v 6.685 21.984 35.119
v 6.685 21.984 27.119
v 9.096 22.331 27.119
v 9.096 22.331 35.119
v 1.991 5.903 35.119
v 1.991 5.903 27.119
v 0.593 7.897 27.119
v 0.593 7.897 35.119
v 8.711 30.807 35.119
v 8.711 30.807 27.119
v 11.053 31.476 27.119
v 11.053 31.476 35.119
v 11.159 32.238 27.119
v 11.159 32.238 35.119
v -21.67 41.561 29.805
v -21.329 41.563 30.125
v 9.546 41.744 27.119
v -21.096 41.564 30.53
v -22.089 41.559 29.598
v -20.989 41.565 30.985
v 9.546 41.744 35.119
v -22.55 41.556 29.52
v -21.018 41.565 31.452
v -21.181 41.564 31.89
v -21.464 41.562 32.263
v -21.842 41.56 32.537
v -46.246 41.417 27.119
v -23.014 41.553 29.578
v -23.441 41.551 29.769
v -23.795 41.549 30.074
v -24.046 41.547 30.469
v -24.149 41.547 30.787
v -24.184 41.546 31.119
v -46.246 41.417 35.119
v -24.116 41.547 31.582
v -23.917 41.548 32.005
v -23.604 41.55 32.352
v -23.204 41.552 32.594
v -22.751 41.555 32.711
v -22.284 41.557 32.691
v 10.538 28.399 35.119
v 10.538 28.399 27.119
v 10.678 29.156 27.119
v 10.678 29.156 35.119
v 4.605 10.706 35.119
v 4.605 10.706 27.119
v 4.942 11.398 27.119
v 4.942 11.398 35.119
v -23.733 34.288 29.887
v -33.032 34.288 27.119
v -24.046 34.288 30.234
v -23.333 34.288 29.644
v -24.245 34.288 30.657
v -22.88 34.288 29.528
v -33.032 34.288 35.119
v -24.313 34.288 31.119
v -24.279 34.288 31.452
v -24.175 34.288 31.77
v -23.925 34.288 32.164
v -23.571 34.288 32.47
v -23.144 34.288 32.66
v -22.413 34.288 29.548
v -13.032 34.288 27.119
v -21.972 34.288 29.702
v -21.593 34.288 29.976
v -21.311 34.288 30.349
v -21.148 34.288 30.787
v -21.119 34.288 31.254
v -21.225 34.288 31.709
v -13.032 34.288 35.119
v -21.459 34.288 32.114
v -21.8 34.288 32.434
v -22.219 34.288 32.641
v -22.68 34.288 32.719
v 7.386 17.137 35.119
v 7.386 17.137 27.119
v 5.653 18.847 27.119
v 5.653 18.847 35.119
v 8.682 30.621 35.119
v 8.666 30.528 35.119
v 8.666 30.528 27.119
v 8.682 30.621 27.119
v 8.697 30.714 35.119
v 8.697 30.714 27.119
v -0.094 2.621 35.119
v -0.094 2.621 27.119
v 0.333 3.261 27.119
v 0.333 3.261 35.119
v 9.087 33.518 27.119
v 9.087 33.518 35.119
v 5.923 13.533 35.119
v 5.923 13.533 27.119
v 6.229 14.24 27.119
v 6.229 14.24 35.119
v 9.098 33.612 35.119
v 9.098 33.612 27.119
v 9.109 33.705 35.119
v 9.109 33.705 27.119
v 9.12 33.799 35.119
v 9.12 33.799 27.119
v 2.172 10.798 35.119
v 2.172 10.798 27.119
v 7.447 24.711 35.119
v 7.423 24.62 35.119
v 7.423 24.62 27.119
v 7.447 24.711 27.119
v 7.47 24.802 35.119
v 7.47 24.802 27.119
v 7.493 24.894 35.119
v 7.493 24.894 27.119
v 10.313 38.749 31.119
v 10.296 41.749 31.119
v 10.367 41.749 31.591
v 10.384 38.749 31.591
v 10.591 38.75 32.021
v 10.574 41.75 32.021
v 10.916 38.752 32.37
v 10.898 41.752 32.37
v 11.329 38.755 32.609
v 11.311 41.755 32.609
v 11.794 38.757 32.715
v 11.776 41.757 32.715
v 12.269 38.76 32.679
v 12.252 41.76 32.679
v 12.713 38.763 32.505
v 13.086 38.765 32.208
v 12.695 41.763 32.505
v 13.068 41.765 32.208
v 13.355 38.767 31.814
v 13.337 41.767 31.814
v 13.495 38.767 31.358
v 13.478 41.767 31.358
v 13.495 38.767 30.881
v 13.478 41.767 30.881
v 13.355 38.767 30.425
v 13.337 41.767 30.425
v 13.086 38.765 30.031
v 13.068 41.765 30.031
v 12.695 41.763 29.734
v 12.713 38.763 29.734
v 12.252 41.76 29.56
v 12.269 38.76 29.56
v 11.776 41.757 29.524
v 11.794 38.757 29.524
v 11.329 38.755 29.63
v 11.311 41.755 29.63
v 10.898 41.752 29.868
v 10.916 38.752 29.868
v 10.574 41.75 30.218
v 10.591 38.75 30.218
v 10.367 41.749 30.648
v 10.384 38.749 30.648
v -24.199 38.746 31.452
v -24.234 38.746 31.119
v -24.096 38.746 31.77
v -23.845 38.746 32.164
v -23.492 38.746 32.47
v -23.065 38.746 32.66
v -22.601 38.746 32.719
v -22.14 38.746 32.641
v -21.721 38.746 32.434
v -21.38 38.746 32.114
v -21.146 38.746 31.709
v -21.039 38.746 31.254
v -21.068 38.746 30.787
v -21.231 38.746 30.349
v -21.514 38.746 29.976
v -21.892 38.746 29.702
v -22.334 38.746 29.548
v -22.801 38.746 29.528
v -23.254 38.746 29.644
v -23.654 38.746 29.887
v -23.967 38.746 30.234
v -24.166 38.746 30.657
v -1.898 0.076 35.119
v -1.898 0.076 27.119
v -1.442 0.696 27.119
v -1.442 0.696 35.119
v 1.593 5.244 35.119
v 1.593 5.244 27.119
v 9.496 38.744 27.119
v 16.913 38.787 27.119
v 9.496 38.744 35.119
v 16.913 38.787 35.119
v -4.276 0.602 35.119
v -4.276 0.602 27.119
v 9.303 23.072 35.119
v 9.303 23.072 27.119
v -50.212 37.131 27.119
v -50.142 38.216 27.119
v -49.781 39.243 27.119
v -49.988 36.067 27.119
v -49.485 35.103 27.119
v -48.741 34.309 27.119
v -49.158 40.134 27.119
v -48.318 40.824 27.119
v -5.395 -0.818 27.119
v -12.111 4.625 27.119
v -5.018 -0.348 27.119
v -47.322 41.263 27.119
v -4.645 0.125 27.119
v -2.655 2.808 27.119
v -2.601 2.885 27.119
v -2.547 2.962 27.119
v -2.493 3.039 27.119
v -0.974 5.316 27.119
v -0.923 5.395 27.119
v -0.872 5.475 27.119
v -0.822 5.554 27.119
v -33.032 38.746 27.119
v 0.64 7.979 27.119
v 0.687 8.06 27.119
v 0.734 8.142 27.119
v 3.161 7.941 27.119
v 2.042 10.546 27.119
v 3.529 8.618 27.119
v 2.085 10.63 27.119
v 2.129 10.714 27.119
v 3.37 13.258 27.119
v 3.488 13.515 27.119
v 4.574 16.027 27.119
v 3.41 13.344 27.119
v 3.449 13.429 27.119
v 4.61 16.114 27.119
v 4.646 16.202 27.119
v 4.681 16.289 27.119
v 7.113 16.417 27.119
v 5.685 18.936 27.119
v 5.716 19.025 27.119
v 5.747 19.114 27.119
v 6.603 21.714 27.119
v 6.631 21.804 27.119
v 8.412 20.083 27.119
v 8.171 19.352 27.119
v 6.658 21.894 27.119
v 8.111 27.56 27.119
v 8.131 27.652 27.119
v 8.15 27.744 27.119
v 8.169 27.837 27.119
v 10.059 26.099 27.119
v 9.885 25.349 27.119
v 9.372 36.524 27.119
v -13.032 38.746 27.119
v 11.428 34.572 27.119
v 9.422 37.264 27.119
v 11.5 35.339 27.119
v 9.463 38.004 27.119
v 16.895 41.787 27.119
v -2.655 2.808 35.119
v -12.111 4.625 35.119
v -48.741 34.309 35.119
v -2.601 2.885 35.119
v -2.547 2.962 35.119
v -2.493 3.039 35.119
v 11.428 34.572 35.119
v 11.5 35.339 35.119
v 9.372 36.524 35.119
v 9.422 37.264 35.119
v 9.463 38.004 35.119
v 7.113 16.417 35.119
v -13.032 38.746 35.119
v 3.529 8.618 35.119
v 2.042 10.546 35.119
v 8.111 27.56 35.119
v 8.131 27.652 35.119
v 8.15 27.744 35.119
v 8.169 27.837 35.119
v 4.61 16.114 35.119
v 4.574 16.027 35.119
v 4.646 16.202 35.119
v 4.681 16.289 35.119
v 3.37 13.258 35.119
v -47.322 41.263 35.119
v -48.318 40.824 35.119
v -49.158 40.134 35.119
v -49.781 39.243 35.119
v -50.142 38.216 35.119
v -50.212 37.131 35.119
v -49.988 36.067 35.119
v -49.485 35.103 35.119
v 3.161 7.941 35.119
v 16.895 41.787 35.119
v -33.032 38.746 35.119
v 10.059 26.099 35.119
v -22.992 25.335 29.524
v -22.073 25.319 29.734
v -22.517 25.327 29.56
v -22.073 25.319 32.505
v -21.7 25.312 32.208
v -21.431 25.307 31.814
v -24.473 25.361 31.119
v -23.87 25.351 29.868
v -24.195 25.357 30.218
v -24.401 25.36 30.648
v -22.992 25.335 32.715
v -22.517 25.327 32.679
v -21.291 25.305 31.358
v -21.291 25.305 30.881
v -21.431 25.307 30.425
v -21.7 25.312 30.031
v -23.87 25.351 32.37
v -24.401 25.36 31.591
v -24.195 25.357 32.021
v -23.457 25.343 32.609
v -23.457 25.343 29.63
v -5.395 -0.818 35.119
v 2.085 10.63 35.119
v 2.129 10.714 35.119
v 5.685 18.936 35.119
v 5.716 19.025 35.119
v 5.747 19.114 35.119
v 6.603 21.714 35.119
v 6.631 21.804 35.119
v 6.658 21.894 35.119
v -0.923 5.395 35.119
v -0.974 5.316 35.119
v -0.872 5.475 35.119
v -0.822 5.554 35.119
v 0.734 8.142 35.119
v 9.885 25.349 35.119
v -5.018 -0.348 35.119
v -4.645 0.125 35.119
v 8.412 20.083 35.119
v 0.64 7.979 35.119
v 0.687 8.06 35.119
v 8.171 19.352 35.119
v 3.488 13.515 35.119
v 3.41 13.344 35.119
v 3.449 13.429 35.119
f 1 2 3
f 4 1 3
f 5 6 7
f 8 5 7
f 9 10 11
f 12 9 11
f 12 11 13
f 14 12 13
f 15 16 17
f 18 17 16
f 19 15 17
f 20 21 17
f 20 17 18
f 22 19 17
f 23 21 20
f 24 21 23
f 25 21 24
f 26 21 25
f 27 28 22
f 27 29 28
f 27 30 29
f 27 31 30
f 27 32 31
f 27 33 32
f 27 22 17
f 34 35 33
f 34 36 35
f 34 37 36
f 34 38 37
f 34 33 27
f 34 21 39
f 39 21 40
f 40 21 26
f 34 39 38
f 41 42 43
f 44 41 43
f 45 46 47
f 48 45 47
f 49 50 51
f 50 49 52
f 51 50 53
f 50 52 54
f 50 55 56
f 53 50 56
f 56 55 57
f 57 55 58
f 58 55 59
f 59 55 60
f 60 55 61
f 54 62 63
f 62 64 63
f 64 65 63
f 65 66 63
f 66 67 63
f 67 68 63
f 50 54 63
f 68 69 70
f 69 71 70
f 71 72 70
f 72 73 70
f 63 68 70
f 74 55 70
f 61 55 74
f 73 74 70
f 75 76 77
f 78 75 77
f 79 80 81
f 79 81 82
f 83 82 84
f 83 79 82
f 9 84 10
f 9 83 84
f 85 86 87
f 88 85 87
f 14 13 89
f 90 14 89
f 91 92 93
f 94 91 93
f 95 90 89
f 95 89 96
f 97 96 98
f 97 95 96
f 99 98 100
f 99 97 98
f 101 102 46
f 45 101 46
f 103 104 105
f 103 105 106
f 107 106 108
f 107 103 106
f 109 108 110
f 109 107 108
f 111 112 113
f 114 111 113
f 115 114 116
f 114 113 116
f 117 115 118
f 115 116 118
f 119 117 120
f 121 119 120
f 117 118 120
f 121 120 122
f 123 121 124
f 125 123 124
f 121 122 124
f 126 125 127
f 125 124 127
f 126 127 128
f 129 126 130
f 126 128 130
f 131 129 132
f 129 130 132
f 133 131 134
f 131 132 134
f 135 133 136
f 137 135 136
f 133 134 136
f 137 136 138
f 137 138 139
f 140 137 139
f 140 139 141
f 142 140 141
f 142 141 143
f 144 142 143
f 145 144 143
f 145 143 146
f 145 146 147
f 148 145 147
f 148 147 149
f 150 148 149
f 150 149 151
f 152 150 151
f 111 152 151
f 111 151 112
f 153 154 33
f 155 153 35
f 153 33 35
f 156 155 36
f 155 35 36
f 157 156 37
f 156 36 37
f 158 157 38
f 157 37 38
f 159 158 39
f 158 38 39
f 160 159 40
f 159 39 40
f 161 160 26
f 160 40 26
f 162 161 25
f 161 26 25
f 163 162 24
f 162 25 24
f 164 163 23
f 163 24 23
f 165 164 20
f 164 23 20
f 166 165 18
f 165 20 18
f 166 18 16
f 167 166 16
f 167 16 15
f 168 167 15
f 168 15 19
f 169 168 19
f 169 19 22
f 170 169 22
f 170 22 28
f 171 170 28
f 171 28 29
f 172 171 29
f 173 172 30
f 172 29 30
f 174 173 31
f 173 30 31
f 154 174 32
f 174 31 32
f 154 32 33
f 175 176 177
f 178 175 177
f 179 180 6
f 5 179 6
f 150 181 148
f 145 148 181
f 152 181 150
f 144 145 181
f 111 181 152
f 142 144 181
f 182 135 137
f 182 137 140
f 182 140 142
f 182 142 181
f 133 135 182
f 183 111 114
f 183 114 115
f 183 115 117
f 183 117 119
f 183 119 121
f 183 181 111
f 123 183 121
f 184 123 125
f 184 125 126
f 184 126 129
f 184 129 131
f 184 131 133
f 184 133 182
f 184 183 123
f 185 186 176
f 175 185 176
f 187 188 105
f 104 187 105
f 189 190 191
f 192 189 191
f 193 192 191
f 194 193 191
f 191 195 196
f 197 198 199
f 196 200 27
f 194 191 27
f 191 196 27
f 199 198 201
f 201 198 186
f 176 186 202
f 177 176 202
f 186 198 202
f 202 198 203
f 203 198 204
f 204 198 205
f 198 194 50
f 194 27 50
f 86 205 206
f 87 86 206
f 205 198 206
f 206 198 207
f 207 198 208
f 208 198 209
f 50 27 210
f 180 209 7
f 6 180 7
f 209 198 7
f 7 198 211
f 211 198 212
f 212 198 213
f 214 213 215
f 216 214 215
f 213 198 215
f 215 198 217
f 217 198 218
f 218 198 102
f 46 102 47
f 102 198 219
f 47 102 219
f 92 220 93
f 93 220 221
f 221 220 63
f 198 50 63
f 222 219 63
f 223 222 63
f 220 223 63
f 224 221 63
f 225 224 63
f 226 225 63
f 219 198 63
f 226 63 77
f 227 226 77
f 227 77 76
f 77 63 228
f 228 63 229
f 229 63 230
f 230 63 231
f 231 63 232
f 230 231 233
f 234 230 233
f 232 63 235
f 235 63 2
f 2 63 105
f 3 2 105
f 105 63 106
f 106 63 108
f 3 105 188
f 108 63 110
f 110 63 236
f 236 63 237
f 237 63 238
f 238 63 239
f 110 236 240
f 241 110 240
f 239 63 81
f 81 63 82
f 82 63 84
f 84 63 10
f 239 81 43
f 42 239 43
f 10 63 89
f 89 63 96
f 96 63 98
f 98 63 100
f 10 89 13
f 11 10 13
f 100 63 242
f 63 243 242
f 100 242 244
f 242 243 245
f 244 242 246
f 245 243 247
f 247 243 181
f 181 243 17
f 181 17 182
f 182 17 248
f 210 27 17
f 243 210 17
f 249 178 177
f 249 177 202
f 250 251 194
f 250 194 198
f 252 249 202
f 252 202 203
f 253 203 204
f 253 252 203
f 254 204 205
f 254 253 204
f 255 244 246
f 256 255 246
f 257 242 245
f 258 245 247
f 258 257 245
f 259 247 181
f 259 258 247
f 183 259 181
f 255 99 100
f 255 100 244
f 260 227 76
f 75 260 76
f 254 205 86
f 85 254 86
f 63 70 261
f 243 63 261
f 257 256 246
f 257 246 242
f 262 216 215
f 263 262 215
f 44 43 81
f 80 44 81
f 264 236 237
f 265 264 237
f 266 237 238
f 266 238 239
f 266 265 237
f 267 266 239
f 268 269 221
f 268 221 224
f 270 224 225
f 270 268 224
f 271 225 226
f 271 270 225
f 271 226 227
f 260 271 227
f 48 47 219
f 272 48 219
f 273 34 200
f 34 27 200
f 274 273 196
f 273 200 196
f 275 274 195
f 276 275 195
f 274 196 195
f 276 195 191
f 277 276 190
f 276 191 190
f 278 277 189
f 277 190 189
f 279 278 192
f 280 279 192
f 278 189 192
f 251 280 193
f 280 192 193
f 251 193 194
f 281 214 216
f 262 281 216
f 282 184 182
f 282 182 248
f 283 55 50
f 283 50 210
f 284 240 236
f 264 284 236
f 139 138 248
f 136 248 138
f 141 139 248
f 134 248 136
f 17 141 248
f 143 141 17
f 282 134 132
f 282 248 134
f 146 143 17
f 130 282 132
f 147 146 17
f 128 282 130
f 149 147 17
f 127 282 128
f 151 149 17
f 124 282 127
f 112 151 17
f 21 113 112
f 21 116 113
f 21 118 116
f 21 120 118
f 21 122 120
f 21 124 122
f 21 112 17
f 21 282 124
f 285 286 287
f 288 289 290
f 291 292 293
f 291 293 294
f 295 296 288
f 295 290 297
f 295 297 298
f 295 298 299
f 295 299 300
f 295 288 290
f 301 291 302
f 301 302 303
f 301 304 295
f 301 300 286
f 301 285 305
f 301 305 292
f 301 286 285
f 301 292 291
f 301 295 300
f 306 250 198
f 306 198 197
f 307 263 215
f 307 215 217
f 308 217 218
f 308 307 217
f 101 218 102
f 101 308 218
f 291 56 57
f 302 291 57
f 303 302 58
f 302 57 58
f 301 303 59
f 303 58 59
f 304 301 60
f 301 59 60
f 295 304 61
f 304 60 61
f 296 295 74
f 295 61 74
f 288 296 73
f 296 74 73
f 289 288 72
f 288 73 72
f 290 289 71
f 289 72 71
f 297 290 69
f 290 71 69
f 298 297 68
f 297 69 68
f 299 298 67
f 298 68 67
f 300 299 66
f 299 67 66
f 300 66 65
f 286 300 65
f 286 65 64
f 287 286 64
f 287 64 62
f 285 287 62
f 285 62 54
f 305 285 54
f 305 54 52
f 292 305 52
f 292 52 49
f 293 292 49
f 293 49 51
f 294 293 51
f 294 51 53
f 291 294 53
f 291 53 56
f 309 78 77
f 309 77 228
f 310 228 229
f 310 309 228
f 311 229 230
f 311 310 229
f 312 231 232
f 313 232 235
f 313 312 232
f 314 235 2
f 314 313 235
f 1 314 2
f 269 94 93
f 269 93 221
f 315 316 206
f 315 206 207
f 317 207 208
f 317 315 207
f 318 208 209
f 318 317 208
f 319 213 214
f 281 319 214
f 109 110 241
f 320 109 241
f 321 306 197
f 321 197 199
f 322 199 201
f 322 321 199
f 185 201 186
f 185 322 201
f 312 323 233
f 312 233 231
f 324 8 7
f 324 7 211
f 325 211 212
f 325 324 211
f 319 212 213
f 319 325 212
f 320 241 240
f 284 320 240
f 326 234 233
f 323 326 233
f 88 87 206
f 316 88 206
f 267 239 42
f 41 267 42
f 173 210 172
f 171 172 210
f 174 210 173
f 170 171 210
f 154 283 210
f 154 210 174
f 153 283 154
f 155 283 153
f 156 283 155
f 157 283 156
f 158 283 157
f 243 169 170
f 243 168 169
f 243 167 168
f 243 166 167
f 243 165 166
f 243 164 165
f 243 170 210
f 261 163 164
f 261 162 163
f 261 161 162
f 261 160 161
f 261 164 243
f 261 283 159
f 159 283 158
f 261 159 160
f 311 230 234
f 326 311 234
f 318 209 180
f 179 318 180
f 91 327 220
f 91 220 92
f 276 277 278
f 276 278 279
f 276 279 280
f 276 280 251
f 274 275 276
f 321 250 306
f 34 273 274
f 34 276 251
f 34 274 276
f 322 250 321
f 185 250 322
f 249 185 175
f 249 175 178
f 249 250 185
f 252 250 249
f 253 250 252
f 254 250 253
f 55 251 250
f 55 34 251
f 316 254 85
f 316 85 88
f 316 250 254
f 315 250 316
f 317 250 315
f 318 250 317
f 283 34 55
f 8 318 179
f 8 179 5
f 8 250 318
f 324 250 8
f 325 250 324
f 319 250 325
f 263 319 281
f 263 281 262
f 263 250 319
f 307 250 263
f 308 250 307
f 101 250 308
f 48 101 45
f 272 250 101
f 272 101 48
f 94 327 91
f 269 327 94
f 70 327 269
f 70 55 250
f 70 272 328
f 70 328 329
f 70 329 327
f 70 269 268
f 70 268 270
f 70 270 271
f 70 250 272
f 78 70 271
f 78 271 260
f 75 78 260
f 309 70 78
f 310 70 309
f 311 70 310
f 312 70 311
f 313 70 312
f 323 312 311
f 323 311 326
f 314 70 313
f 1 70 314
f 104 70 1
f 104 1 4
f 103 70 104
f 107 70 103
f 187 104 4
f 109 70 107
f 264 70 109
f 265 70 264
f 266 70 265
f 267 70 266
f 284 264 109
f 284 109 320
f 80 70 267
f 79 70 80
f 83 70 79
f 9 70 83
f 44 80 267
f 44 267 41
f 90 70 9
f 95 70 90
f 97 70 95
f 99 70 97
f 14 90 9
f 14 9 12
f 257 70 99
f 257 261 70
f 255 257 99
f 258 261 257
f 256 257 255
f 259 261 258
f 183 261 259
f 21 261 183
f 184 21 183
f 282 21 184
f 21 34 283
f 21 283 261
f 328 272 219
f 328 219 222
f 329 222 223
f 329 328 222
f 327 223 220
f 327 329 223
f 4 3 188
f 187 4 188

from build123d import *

# Parameters (mm, degrees)
BOSS_EXTRUDE1_DEPTH = 8
SKETCH10_W          = 20
SKETCH10_H          = 4.457955928
CUT_EXTRUDE1_DEPTH  = 8
SKETCH11_R          = 1.6
CUT_EXTRUDE2_DEPTH  = 17
CIRPATTERN1_START   = 27.11938858
CIRPATTERN1_DEPTH   = 8
FILLET1_R           = 4
SKETCH13_R          = 1.6
CUT_EXTRUDE3_DEPTH  = 4


# Read off the part's stored shape, not the designer's step: CirPattern1
with BuildPart() as part:
    # Sketch9 → Boss-Extrude1 (new body)
    with BuildSketch(Plane.XY.offset(35.11938858)):
        with BuildLine():
            Line((9.545521872, 41.744275524), (-57.430180647, 41.351233323))
            Line((-57.430180647, 41.351233323), (-12.111028973, 4.62462141))
            Line((-12.111028973, 4.62462141), (-5.395050947, -0.818002943))
            ThreePointArc((-5.395050947, -0.818002943), (4.336911047, 15.452862836), (9.11951655, 33.798948033))
            Line((9.11951655, 33.798948033), (11.42846507, 34.572240818))
            Line((11.42846507, 34.572240818), (11.499640251, 35.338944212))
            Line((11.499640251, 35.338944212), (9.372495407, 36.524051722))
            ThreePointArc((9.372495407, 36.524051722), (9.443412954, 37.633480095), (9.495906894, 38.743932705))
            Line((9.495906894, 38.743932705), (16.9130003, 38.787459396))
            Line((16.9130003, 38.787459396), (16.895395314, 41.78740774))
            Line((16.895395314, 41.78740774), (9.545521872, 41.744275524))
        make_face()
    extrude(amount=-BOSS_EXTRUDE1_DEPTH)

    # Sketch10 → Cut-Extrude1 (cut)
    with BuildSketch(Plane.XY.offset(35.11938858)):
        with Locations((-23.032343606, 36.517264559)):
            Rectangle(SKETCH10_W, SKETCH10_H)
    extrude(amount=-CUT_EXTRUDE1_DEPTH, mode=Mode.SUBTRACT)

    # Sketch11 → Cut-Extrude2 (cut)
    with BuildSketch(Plane(origin=(0.747199109, 41.914596091, 0), x_dir=(0.9998411421690517, -0.01782387236506677, 0), z_dir=(0.01782387236506677, 0.9998411421690517, 0))):
        with Locations(Location((-23.320690328, -31.11938858, 0), (0, 0, 180))):
            Circle(SKETCH11_R)
    extrude(amount=-CUT_EXTRUDE2_DEPTH, mode=Mode.SUBTRACT)

    # CirPattern1 outline → CirPattern1 (add)
    with BuildSketch(Plane.XY.offset(CIRPATTERN1_START)):
        with BuildLine():
            Line((-1.898240417, 0.075678285), (-1.442349939, 0.696213436))
            Line((-1.442349939, 0.696213436), (-2.655293453, 2.807609427))
            ThreePointArc((-2.655293453, 2.807609427), (-3.454215375, 1.696544027), (-4.275670815, 0.602033397))
            Line((-4.275670815, 0.602033397), (-1.898240417, 0.075678285))
        make_face()
        with BuildLine():
            ThreePointArc((9.087032741, 33.518000709), (8.913106654, 32.160616358), (8.711484025, 30.807068844))
            Line((8.711484025, 30.807068844), (11.052940174, 31.475505904))
            Line((11.052940174, 31.475505904), (11.158600181, 32.238222079))
            Line((11.158600181, 32.238222079), (9.087032741, 33.518000709))
        make_face()
        with BuildLine():
            ThreePointArc((8.666370259, 30.527871164), (8.431440362, 29.179705557), (8.169015006, 27.836621236))
            Line((8.169015006, 27.836621236), (10.538219647, 28.398843937))
            Line((10.538219647, 28.398843937), (10.678149721, 29.156022631))
            Line((10.678149721, 29.156022631), (8.666370259, 30.527871164))
        make_face()
        with BuildLine():
            ThreePointArc((8.11136298, 27.559740684), (7.81590678, 26.223534041), (7.493212091, 24.893642806))
            Line((7.493212091, 24.893642806), (9.885349689, 25.348508399))
            Line((9.885349689, 25.348508399), (10.059265414, 26.098610606))
            Line((10.059265414, 26.098610606), (8.11136298, 27.559740684))
        make_face()
        with BuildLine():
            ThreePointArc((7.423138984, 24.619642155), (7.067757013, 23.298110387), (6.685448884, 21.984115313))
            Line((6.685448884, 21.984115313), (9.095657291, 22.330699261))
            Line((9.095657291, 22.330699261), (9.303205175, 23.072200358))
            Line((9.303205175, 23.072200358), (7.423138984, 24.619642155))
        make_face()
        with BuildLine():
            ThreePointArc((6.603097126, 21.713551487), (6.188511716, 20.409380678), (5.74736721, 19.113952531))
            Line((5.74736721, 19.113952531), (8.170747547, 19.351550382))
            Line((8.170747547, 19.351550382), (8.411505736, 20.082943228))
            Line((8.411505736, 20.082943228), (6.603097126, 21.713551487))
        make_face()
        with BuildLine():
            ThreePointArc((5.652904183, 18.847375463), (5.179958002, 17.563216411), (4.680873768, 16.288988219))
            Line((4.680873768, 16.288988219), (7.112500384, 16.417117043))
            Line((7.112500384, 16.417117043), (7.385979526, 17.136915042))
            Line((7.385979526, 17.136915042), (5.652904183, 18.847375463))
        make_face()
        with BuildLine():
            ThreePointArc((4.574491474, 16.026939742), (4.04414581, 14.76540257), (3.488136265, 13.514964269))
            Line((3.488136265, 13.514964269), (5.923066749, 13.533363638))
            Line((5.923066749, 13.533363638), (6.228710981, 14.240103762))
            Line((6.228710981, 14.240103762), (4.574491474, 16.026939742))
        make_face()
        with BuildLine():
            ThreePointArc((3.370050932, 13.257977012), (2.783383741, 12.021625861), (2.171579003, 10.797519035))
            Line((2.171579003, 10.797519035), (4.604864227, 10.70615155))
            Line((4.604864227, 10.70615155), (4.942052312, 11.398397312))
            Line((4.942052312, 11.398397312), (3.370050932, 13.257977012))
        make_face()
        with BuildLine():
            ThreePointArc((2.042030645, 10.546115336), (1.400234361, 9.337463157), (0.733877956, 8.142175869))
            Line((0.733877956, 8.142175869), (3.160572137, 7.94122724))
            Line((3.160572137, 7.94122724), (3.528618722, 8.617571614))
            Line((3.528618722, 8.617571614), (2.042030645, 10.546115336))
        make_face()
        with BuildLine():
            ThreePointArc((0.593129889, 7.896866722), (-0.102491005, 6.718370166), (-0.82204467, 5.554331901))
            Line((-0.82204467, 5.554331901), (1.593126081, 5.244210567))
            Line((1.593126081, 5.244210567), (1.991283091, 5.903278845))
            Line((1.991283091, 5.903278845), (0.593129889, 7.896866722))
        make_face()
        with BuildLine():
            ThreePointArc((-0.973706371, 5.315615908), (-1.721737986, 4.169670332), (-2.493026381, 3.039247062))
            Line((-2.493026381, 3.039247062), (-0.094288024, 2.620583361))
            Line((-0.094288024, 2.620583361), (0.333170136, 3.261035952))
            Line((0.333170136, 3.261035952), (-0.973706371, 5.315615908))
        make_face()
    extrude(amount=CIRPATTERN1_DEPTH)

    # Fillet1
    fillet1_edges = [part.edges().sort_by_distance(p)[0] for p in [
        (-57.430180647, 41.351233323, 31.11938858),
    ]]
    fillet(fillet1_edges, radius=FILLET1_R)

    # Sketch13 → Cut-Extrude3 (cut)
    with BuildSketch(Plane(origin=(-0.244636188, 41.68682267, 0), x_dir=(0.9999827812112165, 0.005868328644527354, 0), z_dir=(-0.005868328644527354, 0.9999827812112165, 0))):
        with Locations(Location((12.140326638, -31.11938858, 0), (0, 0, 180))):
            Circle(SKETCH13_R)
    extrude(amount=-CUT_EXTRUDE3_DEPTH, mode=Mode.SUBTRACT)


solid = part.part
